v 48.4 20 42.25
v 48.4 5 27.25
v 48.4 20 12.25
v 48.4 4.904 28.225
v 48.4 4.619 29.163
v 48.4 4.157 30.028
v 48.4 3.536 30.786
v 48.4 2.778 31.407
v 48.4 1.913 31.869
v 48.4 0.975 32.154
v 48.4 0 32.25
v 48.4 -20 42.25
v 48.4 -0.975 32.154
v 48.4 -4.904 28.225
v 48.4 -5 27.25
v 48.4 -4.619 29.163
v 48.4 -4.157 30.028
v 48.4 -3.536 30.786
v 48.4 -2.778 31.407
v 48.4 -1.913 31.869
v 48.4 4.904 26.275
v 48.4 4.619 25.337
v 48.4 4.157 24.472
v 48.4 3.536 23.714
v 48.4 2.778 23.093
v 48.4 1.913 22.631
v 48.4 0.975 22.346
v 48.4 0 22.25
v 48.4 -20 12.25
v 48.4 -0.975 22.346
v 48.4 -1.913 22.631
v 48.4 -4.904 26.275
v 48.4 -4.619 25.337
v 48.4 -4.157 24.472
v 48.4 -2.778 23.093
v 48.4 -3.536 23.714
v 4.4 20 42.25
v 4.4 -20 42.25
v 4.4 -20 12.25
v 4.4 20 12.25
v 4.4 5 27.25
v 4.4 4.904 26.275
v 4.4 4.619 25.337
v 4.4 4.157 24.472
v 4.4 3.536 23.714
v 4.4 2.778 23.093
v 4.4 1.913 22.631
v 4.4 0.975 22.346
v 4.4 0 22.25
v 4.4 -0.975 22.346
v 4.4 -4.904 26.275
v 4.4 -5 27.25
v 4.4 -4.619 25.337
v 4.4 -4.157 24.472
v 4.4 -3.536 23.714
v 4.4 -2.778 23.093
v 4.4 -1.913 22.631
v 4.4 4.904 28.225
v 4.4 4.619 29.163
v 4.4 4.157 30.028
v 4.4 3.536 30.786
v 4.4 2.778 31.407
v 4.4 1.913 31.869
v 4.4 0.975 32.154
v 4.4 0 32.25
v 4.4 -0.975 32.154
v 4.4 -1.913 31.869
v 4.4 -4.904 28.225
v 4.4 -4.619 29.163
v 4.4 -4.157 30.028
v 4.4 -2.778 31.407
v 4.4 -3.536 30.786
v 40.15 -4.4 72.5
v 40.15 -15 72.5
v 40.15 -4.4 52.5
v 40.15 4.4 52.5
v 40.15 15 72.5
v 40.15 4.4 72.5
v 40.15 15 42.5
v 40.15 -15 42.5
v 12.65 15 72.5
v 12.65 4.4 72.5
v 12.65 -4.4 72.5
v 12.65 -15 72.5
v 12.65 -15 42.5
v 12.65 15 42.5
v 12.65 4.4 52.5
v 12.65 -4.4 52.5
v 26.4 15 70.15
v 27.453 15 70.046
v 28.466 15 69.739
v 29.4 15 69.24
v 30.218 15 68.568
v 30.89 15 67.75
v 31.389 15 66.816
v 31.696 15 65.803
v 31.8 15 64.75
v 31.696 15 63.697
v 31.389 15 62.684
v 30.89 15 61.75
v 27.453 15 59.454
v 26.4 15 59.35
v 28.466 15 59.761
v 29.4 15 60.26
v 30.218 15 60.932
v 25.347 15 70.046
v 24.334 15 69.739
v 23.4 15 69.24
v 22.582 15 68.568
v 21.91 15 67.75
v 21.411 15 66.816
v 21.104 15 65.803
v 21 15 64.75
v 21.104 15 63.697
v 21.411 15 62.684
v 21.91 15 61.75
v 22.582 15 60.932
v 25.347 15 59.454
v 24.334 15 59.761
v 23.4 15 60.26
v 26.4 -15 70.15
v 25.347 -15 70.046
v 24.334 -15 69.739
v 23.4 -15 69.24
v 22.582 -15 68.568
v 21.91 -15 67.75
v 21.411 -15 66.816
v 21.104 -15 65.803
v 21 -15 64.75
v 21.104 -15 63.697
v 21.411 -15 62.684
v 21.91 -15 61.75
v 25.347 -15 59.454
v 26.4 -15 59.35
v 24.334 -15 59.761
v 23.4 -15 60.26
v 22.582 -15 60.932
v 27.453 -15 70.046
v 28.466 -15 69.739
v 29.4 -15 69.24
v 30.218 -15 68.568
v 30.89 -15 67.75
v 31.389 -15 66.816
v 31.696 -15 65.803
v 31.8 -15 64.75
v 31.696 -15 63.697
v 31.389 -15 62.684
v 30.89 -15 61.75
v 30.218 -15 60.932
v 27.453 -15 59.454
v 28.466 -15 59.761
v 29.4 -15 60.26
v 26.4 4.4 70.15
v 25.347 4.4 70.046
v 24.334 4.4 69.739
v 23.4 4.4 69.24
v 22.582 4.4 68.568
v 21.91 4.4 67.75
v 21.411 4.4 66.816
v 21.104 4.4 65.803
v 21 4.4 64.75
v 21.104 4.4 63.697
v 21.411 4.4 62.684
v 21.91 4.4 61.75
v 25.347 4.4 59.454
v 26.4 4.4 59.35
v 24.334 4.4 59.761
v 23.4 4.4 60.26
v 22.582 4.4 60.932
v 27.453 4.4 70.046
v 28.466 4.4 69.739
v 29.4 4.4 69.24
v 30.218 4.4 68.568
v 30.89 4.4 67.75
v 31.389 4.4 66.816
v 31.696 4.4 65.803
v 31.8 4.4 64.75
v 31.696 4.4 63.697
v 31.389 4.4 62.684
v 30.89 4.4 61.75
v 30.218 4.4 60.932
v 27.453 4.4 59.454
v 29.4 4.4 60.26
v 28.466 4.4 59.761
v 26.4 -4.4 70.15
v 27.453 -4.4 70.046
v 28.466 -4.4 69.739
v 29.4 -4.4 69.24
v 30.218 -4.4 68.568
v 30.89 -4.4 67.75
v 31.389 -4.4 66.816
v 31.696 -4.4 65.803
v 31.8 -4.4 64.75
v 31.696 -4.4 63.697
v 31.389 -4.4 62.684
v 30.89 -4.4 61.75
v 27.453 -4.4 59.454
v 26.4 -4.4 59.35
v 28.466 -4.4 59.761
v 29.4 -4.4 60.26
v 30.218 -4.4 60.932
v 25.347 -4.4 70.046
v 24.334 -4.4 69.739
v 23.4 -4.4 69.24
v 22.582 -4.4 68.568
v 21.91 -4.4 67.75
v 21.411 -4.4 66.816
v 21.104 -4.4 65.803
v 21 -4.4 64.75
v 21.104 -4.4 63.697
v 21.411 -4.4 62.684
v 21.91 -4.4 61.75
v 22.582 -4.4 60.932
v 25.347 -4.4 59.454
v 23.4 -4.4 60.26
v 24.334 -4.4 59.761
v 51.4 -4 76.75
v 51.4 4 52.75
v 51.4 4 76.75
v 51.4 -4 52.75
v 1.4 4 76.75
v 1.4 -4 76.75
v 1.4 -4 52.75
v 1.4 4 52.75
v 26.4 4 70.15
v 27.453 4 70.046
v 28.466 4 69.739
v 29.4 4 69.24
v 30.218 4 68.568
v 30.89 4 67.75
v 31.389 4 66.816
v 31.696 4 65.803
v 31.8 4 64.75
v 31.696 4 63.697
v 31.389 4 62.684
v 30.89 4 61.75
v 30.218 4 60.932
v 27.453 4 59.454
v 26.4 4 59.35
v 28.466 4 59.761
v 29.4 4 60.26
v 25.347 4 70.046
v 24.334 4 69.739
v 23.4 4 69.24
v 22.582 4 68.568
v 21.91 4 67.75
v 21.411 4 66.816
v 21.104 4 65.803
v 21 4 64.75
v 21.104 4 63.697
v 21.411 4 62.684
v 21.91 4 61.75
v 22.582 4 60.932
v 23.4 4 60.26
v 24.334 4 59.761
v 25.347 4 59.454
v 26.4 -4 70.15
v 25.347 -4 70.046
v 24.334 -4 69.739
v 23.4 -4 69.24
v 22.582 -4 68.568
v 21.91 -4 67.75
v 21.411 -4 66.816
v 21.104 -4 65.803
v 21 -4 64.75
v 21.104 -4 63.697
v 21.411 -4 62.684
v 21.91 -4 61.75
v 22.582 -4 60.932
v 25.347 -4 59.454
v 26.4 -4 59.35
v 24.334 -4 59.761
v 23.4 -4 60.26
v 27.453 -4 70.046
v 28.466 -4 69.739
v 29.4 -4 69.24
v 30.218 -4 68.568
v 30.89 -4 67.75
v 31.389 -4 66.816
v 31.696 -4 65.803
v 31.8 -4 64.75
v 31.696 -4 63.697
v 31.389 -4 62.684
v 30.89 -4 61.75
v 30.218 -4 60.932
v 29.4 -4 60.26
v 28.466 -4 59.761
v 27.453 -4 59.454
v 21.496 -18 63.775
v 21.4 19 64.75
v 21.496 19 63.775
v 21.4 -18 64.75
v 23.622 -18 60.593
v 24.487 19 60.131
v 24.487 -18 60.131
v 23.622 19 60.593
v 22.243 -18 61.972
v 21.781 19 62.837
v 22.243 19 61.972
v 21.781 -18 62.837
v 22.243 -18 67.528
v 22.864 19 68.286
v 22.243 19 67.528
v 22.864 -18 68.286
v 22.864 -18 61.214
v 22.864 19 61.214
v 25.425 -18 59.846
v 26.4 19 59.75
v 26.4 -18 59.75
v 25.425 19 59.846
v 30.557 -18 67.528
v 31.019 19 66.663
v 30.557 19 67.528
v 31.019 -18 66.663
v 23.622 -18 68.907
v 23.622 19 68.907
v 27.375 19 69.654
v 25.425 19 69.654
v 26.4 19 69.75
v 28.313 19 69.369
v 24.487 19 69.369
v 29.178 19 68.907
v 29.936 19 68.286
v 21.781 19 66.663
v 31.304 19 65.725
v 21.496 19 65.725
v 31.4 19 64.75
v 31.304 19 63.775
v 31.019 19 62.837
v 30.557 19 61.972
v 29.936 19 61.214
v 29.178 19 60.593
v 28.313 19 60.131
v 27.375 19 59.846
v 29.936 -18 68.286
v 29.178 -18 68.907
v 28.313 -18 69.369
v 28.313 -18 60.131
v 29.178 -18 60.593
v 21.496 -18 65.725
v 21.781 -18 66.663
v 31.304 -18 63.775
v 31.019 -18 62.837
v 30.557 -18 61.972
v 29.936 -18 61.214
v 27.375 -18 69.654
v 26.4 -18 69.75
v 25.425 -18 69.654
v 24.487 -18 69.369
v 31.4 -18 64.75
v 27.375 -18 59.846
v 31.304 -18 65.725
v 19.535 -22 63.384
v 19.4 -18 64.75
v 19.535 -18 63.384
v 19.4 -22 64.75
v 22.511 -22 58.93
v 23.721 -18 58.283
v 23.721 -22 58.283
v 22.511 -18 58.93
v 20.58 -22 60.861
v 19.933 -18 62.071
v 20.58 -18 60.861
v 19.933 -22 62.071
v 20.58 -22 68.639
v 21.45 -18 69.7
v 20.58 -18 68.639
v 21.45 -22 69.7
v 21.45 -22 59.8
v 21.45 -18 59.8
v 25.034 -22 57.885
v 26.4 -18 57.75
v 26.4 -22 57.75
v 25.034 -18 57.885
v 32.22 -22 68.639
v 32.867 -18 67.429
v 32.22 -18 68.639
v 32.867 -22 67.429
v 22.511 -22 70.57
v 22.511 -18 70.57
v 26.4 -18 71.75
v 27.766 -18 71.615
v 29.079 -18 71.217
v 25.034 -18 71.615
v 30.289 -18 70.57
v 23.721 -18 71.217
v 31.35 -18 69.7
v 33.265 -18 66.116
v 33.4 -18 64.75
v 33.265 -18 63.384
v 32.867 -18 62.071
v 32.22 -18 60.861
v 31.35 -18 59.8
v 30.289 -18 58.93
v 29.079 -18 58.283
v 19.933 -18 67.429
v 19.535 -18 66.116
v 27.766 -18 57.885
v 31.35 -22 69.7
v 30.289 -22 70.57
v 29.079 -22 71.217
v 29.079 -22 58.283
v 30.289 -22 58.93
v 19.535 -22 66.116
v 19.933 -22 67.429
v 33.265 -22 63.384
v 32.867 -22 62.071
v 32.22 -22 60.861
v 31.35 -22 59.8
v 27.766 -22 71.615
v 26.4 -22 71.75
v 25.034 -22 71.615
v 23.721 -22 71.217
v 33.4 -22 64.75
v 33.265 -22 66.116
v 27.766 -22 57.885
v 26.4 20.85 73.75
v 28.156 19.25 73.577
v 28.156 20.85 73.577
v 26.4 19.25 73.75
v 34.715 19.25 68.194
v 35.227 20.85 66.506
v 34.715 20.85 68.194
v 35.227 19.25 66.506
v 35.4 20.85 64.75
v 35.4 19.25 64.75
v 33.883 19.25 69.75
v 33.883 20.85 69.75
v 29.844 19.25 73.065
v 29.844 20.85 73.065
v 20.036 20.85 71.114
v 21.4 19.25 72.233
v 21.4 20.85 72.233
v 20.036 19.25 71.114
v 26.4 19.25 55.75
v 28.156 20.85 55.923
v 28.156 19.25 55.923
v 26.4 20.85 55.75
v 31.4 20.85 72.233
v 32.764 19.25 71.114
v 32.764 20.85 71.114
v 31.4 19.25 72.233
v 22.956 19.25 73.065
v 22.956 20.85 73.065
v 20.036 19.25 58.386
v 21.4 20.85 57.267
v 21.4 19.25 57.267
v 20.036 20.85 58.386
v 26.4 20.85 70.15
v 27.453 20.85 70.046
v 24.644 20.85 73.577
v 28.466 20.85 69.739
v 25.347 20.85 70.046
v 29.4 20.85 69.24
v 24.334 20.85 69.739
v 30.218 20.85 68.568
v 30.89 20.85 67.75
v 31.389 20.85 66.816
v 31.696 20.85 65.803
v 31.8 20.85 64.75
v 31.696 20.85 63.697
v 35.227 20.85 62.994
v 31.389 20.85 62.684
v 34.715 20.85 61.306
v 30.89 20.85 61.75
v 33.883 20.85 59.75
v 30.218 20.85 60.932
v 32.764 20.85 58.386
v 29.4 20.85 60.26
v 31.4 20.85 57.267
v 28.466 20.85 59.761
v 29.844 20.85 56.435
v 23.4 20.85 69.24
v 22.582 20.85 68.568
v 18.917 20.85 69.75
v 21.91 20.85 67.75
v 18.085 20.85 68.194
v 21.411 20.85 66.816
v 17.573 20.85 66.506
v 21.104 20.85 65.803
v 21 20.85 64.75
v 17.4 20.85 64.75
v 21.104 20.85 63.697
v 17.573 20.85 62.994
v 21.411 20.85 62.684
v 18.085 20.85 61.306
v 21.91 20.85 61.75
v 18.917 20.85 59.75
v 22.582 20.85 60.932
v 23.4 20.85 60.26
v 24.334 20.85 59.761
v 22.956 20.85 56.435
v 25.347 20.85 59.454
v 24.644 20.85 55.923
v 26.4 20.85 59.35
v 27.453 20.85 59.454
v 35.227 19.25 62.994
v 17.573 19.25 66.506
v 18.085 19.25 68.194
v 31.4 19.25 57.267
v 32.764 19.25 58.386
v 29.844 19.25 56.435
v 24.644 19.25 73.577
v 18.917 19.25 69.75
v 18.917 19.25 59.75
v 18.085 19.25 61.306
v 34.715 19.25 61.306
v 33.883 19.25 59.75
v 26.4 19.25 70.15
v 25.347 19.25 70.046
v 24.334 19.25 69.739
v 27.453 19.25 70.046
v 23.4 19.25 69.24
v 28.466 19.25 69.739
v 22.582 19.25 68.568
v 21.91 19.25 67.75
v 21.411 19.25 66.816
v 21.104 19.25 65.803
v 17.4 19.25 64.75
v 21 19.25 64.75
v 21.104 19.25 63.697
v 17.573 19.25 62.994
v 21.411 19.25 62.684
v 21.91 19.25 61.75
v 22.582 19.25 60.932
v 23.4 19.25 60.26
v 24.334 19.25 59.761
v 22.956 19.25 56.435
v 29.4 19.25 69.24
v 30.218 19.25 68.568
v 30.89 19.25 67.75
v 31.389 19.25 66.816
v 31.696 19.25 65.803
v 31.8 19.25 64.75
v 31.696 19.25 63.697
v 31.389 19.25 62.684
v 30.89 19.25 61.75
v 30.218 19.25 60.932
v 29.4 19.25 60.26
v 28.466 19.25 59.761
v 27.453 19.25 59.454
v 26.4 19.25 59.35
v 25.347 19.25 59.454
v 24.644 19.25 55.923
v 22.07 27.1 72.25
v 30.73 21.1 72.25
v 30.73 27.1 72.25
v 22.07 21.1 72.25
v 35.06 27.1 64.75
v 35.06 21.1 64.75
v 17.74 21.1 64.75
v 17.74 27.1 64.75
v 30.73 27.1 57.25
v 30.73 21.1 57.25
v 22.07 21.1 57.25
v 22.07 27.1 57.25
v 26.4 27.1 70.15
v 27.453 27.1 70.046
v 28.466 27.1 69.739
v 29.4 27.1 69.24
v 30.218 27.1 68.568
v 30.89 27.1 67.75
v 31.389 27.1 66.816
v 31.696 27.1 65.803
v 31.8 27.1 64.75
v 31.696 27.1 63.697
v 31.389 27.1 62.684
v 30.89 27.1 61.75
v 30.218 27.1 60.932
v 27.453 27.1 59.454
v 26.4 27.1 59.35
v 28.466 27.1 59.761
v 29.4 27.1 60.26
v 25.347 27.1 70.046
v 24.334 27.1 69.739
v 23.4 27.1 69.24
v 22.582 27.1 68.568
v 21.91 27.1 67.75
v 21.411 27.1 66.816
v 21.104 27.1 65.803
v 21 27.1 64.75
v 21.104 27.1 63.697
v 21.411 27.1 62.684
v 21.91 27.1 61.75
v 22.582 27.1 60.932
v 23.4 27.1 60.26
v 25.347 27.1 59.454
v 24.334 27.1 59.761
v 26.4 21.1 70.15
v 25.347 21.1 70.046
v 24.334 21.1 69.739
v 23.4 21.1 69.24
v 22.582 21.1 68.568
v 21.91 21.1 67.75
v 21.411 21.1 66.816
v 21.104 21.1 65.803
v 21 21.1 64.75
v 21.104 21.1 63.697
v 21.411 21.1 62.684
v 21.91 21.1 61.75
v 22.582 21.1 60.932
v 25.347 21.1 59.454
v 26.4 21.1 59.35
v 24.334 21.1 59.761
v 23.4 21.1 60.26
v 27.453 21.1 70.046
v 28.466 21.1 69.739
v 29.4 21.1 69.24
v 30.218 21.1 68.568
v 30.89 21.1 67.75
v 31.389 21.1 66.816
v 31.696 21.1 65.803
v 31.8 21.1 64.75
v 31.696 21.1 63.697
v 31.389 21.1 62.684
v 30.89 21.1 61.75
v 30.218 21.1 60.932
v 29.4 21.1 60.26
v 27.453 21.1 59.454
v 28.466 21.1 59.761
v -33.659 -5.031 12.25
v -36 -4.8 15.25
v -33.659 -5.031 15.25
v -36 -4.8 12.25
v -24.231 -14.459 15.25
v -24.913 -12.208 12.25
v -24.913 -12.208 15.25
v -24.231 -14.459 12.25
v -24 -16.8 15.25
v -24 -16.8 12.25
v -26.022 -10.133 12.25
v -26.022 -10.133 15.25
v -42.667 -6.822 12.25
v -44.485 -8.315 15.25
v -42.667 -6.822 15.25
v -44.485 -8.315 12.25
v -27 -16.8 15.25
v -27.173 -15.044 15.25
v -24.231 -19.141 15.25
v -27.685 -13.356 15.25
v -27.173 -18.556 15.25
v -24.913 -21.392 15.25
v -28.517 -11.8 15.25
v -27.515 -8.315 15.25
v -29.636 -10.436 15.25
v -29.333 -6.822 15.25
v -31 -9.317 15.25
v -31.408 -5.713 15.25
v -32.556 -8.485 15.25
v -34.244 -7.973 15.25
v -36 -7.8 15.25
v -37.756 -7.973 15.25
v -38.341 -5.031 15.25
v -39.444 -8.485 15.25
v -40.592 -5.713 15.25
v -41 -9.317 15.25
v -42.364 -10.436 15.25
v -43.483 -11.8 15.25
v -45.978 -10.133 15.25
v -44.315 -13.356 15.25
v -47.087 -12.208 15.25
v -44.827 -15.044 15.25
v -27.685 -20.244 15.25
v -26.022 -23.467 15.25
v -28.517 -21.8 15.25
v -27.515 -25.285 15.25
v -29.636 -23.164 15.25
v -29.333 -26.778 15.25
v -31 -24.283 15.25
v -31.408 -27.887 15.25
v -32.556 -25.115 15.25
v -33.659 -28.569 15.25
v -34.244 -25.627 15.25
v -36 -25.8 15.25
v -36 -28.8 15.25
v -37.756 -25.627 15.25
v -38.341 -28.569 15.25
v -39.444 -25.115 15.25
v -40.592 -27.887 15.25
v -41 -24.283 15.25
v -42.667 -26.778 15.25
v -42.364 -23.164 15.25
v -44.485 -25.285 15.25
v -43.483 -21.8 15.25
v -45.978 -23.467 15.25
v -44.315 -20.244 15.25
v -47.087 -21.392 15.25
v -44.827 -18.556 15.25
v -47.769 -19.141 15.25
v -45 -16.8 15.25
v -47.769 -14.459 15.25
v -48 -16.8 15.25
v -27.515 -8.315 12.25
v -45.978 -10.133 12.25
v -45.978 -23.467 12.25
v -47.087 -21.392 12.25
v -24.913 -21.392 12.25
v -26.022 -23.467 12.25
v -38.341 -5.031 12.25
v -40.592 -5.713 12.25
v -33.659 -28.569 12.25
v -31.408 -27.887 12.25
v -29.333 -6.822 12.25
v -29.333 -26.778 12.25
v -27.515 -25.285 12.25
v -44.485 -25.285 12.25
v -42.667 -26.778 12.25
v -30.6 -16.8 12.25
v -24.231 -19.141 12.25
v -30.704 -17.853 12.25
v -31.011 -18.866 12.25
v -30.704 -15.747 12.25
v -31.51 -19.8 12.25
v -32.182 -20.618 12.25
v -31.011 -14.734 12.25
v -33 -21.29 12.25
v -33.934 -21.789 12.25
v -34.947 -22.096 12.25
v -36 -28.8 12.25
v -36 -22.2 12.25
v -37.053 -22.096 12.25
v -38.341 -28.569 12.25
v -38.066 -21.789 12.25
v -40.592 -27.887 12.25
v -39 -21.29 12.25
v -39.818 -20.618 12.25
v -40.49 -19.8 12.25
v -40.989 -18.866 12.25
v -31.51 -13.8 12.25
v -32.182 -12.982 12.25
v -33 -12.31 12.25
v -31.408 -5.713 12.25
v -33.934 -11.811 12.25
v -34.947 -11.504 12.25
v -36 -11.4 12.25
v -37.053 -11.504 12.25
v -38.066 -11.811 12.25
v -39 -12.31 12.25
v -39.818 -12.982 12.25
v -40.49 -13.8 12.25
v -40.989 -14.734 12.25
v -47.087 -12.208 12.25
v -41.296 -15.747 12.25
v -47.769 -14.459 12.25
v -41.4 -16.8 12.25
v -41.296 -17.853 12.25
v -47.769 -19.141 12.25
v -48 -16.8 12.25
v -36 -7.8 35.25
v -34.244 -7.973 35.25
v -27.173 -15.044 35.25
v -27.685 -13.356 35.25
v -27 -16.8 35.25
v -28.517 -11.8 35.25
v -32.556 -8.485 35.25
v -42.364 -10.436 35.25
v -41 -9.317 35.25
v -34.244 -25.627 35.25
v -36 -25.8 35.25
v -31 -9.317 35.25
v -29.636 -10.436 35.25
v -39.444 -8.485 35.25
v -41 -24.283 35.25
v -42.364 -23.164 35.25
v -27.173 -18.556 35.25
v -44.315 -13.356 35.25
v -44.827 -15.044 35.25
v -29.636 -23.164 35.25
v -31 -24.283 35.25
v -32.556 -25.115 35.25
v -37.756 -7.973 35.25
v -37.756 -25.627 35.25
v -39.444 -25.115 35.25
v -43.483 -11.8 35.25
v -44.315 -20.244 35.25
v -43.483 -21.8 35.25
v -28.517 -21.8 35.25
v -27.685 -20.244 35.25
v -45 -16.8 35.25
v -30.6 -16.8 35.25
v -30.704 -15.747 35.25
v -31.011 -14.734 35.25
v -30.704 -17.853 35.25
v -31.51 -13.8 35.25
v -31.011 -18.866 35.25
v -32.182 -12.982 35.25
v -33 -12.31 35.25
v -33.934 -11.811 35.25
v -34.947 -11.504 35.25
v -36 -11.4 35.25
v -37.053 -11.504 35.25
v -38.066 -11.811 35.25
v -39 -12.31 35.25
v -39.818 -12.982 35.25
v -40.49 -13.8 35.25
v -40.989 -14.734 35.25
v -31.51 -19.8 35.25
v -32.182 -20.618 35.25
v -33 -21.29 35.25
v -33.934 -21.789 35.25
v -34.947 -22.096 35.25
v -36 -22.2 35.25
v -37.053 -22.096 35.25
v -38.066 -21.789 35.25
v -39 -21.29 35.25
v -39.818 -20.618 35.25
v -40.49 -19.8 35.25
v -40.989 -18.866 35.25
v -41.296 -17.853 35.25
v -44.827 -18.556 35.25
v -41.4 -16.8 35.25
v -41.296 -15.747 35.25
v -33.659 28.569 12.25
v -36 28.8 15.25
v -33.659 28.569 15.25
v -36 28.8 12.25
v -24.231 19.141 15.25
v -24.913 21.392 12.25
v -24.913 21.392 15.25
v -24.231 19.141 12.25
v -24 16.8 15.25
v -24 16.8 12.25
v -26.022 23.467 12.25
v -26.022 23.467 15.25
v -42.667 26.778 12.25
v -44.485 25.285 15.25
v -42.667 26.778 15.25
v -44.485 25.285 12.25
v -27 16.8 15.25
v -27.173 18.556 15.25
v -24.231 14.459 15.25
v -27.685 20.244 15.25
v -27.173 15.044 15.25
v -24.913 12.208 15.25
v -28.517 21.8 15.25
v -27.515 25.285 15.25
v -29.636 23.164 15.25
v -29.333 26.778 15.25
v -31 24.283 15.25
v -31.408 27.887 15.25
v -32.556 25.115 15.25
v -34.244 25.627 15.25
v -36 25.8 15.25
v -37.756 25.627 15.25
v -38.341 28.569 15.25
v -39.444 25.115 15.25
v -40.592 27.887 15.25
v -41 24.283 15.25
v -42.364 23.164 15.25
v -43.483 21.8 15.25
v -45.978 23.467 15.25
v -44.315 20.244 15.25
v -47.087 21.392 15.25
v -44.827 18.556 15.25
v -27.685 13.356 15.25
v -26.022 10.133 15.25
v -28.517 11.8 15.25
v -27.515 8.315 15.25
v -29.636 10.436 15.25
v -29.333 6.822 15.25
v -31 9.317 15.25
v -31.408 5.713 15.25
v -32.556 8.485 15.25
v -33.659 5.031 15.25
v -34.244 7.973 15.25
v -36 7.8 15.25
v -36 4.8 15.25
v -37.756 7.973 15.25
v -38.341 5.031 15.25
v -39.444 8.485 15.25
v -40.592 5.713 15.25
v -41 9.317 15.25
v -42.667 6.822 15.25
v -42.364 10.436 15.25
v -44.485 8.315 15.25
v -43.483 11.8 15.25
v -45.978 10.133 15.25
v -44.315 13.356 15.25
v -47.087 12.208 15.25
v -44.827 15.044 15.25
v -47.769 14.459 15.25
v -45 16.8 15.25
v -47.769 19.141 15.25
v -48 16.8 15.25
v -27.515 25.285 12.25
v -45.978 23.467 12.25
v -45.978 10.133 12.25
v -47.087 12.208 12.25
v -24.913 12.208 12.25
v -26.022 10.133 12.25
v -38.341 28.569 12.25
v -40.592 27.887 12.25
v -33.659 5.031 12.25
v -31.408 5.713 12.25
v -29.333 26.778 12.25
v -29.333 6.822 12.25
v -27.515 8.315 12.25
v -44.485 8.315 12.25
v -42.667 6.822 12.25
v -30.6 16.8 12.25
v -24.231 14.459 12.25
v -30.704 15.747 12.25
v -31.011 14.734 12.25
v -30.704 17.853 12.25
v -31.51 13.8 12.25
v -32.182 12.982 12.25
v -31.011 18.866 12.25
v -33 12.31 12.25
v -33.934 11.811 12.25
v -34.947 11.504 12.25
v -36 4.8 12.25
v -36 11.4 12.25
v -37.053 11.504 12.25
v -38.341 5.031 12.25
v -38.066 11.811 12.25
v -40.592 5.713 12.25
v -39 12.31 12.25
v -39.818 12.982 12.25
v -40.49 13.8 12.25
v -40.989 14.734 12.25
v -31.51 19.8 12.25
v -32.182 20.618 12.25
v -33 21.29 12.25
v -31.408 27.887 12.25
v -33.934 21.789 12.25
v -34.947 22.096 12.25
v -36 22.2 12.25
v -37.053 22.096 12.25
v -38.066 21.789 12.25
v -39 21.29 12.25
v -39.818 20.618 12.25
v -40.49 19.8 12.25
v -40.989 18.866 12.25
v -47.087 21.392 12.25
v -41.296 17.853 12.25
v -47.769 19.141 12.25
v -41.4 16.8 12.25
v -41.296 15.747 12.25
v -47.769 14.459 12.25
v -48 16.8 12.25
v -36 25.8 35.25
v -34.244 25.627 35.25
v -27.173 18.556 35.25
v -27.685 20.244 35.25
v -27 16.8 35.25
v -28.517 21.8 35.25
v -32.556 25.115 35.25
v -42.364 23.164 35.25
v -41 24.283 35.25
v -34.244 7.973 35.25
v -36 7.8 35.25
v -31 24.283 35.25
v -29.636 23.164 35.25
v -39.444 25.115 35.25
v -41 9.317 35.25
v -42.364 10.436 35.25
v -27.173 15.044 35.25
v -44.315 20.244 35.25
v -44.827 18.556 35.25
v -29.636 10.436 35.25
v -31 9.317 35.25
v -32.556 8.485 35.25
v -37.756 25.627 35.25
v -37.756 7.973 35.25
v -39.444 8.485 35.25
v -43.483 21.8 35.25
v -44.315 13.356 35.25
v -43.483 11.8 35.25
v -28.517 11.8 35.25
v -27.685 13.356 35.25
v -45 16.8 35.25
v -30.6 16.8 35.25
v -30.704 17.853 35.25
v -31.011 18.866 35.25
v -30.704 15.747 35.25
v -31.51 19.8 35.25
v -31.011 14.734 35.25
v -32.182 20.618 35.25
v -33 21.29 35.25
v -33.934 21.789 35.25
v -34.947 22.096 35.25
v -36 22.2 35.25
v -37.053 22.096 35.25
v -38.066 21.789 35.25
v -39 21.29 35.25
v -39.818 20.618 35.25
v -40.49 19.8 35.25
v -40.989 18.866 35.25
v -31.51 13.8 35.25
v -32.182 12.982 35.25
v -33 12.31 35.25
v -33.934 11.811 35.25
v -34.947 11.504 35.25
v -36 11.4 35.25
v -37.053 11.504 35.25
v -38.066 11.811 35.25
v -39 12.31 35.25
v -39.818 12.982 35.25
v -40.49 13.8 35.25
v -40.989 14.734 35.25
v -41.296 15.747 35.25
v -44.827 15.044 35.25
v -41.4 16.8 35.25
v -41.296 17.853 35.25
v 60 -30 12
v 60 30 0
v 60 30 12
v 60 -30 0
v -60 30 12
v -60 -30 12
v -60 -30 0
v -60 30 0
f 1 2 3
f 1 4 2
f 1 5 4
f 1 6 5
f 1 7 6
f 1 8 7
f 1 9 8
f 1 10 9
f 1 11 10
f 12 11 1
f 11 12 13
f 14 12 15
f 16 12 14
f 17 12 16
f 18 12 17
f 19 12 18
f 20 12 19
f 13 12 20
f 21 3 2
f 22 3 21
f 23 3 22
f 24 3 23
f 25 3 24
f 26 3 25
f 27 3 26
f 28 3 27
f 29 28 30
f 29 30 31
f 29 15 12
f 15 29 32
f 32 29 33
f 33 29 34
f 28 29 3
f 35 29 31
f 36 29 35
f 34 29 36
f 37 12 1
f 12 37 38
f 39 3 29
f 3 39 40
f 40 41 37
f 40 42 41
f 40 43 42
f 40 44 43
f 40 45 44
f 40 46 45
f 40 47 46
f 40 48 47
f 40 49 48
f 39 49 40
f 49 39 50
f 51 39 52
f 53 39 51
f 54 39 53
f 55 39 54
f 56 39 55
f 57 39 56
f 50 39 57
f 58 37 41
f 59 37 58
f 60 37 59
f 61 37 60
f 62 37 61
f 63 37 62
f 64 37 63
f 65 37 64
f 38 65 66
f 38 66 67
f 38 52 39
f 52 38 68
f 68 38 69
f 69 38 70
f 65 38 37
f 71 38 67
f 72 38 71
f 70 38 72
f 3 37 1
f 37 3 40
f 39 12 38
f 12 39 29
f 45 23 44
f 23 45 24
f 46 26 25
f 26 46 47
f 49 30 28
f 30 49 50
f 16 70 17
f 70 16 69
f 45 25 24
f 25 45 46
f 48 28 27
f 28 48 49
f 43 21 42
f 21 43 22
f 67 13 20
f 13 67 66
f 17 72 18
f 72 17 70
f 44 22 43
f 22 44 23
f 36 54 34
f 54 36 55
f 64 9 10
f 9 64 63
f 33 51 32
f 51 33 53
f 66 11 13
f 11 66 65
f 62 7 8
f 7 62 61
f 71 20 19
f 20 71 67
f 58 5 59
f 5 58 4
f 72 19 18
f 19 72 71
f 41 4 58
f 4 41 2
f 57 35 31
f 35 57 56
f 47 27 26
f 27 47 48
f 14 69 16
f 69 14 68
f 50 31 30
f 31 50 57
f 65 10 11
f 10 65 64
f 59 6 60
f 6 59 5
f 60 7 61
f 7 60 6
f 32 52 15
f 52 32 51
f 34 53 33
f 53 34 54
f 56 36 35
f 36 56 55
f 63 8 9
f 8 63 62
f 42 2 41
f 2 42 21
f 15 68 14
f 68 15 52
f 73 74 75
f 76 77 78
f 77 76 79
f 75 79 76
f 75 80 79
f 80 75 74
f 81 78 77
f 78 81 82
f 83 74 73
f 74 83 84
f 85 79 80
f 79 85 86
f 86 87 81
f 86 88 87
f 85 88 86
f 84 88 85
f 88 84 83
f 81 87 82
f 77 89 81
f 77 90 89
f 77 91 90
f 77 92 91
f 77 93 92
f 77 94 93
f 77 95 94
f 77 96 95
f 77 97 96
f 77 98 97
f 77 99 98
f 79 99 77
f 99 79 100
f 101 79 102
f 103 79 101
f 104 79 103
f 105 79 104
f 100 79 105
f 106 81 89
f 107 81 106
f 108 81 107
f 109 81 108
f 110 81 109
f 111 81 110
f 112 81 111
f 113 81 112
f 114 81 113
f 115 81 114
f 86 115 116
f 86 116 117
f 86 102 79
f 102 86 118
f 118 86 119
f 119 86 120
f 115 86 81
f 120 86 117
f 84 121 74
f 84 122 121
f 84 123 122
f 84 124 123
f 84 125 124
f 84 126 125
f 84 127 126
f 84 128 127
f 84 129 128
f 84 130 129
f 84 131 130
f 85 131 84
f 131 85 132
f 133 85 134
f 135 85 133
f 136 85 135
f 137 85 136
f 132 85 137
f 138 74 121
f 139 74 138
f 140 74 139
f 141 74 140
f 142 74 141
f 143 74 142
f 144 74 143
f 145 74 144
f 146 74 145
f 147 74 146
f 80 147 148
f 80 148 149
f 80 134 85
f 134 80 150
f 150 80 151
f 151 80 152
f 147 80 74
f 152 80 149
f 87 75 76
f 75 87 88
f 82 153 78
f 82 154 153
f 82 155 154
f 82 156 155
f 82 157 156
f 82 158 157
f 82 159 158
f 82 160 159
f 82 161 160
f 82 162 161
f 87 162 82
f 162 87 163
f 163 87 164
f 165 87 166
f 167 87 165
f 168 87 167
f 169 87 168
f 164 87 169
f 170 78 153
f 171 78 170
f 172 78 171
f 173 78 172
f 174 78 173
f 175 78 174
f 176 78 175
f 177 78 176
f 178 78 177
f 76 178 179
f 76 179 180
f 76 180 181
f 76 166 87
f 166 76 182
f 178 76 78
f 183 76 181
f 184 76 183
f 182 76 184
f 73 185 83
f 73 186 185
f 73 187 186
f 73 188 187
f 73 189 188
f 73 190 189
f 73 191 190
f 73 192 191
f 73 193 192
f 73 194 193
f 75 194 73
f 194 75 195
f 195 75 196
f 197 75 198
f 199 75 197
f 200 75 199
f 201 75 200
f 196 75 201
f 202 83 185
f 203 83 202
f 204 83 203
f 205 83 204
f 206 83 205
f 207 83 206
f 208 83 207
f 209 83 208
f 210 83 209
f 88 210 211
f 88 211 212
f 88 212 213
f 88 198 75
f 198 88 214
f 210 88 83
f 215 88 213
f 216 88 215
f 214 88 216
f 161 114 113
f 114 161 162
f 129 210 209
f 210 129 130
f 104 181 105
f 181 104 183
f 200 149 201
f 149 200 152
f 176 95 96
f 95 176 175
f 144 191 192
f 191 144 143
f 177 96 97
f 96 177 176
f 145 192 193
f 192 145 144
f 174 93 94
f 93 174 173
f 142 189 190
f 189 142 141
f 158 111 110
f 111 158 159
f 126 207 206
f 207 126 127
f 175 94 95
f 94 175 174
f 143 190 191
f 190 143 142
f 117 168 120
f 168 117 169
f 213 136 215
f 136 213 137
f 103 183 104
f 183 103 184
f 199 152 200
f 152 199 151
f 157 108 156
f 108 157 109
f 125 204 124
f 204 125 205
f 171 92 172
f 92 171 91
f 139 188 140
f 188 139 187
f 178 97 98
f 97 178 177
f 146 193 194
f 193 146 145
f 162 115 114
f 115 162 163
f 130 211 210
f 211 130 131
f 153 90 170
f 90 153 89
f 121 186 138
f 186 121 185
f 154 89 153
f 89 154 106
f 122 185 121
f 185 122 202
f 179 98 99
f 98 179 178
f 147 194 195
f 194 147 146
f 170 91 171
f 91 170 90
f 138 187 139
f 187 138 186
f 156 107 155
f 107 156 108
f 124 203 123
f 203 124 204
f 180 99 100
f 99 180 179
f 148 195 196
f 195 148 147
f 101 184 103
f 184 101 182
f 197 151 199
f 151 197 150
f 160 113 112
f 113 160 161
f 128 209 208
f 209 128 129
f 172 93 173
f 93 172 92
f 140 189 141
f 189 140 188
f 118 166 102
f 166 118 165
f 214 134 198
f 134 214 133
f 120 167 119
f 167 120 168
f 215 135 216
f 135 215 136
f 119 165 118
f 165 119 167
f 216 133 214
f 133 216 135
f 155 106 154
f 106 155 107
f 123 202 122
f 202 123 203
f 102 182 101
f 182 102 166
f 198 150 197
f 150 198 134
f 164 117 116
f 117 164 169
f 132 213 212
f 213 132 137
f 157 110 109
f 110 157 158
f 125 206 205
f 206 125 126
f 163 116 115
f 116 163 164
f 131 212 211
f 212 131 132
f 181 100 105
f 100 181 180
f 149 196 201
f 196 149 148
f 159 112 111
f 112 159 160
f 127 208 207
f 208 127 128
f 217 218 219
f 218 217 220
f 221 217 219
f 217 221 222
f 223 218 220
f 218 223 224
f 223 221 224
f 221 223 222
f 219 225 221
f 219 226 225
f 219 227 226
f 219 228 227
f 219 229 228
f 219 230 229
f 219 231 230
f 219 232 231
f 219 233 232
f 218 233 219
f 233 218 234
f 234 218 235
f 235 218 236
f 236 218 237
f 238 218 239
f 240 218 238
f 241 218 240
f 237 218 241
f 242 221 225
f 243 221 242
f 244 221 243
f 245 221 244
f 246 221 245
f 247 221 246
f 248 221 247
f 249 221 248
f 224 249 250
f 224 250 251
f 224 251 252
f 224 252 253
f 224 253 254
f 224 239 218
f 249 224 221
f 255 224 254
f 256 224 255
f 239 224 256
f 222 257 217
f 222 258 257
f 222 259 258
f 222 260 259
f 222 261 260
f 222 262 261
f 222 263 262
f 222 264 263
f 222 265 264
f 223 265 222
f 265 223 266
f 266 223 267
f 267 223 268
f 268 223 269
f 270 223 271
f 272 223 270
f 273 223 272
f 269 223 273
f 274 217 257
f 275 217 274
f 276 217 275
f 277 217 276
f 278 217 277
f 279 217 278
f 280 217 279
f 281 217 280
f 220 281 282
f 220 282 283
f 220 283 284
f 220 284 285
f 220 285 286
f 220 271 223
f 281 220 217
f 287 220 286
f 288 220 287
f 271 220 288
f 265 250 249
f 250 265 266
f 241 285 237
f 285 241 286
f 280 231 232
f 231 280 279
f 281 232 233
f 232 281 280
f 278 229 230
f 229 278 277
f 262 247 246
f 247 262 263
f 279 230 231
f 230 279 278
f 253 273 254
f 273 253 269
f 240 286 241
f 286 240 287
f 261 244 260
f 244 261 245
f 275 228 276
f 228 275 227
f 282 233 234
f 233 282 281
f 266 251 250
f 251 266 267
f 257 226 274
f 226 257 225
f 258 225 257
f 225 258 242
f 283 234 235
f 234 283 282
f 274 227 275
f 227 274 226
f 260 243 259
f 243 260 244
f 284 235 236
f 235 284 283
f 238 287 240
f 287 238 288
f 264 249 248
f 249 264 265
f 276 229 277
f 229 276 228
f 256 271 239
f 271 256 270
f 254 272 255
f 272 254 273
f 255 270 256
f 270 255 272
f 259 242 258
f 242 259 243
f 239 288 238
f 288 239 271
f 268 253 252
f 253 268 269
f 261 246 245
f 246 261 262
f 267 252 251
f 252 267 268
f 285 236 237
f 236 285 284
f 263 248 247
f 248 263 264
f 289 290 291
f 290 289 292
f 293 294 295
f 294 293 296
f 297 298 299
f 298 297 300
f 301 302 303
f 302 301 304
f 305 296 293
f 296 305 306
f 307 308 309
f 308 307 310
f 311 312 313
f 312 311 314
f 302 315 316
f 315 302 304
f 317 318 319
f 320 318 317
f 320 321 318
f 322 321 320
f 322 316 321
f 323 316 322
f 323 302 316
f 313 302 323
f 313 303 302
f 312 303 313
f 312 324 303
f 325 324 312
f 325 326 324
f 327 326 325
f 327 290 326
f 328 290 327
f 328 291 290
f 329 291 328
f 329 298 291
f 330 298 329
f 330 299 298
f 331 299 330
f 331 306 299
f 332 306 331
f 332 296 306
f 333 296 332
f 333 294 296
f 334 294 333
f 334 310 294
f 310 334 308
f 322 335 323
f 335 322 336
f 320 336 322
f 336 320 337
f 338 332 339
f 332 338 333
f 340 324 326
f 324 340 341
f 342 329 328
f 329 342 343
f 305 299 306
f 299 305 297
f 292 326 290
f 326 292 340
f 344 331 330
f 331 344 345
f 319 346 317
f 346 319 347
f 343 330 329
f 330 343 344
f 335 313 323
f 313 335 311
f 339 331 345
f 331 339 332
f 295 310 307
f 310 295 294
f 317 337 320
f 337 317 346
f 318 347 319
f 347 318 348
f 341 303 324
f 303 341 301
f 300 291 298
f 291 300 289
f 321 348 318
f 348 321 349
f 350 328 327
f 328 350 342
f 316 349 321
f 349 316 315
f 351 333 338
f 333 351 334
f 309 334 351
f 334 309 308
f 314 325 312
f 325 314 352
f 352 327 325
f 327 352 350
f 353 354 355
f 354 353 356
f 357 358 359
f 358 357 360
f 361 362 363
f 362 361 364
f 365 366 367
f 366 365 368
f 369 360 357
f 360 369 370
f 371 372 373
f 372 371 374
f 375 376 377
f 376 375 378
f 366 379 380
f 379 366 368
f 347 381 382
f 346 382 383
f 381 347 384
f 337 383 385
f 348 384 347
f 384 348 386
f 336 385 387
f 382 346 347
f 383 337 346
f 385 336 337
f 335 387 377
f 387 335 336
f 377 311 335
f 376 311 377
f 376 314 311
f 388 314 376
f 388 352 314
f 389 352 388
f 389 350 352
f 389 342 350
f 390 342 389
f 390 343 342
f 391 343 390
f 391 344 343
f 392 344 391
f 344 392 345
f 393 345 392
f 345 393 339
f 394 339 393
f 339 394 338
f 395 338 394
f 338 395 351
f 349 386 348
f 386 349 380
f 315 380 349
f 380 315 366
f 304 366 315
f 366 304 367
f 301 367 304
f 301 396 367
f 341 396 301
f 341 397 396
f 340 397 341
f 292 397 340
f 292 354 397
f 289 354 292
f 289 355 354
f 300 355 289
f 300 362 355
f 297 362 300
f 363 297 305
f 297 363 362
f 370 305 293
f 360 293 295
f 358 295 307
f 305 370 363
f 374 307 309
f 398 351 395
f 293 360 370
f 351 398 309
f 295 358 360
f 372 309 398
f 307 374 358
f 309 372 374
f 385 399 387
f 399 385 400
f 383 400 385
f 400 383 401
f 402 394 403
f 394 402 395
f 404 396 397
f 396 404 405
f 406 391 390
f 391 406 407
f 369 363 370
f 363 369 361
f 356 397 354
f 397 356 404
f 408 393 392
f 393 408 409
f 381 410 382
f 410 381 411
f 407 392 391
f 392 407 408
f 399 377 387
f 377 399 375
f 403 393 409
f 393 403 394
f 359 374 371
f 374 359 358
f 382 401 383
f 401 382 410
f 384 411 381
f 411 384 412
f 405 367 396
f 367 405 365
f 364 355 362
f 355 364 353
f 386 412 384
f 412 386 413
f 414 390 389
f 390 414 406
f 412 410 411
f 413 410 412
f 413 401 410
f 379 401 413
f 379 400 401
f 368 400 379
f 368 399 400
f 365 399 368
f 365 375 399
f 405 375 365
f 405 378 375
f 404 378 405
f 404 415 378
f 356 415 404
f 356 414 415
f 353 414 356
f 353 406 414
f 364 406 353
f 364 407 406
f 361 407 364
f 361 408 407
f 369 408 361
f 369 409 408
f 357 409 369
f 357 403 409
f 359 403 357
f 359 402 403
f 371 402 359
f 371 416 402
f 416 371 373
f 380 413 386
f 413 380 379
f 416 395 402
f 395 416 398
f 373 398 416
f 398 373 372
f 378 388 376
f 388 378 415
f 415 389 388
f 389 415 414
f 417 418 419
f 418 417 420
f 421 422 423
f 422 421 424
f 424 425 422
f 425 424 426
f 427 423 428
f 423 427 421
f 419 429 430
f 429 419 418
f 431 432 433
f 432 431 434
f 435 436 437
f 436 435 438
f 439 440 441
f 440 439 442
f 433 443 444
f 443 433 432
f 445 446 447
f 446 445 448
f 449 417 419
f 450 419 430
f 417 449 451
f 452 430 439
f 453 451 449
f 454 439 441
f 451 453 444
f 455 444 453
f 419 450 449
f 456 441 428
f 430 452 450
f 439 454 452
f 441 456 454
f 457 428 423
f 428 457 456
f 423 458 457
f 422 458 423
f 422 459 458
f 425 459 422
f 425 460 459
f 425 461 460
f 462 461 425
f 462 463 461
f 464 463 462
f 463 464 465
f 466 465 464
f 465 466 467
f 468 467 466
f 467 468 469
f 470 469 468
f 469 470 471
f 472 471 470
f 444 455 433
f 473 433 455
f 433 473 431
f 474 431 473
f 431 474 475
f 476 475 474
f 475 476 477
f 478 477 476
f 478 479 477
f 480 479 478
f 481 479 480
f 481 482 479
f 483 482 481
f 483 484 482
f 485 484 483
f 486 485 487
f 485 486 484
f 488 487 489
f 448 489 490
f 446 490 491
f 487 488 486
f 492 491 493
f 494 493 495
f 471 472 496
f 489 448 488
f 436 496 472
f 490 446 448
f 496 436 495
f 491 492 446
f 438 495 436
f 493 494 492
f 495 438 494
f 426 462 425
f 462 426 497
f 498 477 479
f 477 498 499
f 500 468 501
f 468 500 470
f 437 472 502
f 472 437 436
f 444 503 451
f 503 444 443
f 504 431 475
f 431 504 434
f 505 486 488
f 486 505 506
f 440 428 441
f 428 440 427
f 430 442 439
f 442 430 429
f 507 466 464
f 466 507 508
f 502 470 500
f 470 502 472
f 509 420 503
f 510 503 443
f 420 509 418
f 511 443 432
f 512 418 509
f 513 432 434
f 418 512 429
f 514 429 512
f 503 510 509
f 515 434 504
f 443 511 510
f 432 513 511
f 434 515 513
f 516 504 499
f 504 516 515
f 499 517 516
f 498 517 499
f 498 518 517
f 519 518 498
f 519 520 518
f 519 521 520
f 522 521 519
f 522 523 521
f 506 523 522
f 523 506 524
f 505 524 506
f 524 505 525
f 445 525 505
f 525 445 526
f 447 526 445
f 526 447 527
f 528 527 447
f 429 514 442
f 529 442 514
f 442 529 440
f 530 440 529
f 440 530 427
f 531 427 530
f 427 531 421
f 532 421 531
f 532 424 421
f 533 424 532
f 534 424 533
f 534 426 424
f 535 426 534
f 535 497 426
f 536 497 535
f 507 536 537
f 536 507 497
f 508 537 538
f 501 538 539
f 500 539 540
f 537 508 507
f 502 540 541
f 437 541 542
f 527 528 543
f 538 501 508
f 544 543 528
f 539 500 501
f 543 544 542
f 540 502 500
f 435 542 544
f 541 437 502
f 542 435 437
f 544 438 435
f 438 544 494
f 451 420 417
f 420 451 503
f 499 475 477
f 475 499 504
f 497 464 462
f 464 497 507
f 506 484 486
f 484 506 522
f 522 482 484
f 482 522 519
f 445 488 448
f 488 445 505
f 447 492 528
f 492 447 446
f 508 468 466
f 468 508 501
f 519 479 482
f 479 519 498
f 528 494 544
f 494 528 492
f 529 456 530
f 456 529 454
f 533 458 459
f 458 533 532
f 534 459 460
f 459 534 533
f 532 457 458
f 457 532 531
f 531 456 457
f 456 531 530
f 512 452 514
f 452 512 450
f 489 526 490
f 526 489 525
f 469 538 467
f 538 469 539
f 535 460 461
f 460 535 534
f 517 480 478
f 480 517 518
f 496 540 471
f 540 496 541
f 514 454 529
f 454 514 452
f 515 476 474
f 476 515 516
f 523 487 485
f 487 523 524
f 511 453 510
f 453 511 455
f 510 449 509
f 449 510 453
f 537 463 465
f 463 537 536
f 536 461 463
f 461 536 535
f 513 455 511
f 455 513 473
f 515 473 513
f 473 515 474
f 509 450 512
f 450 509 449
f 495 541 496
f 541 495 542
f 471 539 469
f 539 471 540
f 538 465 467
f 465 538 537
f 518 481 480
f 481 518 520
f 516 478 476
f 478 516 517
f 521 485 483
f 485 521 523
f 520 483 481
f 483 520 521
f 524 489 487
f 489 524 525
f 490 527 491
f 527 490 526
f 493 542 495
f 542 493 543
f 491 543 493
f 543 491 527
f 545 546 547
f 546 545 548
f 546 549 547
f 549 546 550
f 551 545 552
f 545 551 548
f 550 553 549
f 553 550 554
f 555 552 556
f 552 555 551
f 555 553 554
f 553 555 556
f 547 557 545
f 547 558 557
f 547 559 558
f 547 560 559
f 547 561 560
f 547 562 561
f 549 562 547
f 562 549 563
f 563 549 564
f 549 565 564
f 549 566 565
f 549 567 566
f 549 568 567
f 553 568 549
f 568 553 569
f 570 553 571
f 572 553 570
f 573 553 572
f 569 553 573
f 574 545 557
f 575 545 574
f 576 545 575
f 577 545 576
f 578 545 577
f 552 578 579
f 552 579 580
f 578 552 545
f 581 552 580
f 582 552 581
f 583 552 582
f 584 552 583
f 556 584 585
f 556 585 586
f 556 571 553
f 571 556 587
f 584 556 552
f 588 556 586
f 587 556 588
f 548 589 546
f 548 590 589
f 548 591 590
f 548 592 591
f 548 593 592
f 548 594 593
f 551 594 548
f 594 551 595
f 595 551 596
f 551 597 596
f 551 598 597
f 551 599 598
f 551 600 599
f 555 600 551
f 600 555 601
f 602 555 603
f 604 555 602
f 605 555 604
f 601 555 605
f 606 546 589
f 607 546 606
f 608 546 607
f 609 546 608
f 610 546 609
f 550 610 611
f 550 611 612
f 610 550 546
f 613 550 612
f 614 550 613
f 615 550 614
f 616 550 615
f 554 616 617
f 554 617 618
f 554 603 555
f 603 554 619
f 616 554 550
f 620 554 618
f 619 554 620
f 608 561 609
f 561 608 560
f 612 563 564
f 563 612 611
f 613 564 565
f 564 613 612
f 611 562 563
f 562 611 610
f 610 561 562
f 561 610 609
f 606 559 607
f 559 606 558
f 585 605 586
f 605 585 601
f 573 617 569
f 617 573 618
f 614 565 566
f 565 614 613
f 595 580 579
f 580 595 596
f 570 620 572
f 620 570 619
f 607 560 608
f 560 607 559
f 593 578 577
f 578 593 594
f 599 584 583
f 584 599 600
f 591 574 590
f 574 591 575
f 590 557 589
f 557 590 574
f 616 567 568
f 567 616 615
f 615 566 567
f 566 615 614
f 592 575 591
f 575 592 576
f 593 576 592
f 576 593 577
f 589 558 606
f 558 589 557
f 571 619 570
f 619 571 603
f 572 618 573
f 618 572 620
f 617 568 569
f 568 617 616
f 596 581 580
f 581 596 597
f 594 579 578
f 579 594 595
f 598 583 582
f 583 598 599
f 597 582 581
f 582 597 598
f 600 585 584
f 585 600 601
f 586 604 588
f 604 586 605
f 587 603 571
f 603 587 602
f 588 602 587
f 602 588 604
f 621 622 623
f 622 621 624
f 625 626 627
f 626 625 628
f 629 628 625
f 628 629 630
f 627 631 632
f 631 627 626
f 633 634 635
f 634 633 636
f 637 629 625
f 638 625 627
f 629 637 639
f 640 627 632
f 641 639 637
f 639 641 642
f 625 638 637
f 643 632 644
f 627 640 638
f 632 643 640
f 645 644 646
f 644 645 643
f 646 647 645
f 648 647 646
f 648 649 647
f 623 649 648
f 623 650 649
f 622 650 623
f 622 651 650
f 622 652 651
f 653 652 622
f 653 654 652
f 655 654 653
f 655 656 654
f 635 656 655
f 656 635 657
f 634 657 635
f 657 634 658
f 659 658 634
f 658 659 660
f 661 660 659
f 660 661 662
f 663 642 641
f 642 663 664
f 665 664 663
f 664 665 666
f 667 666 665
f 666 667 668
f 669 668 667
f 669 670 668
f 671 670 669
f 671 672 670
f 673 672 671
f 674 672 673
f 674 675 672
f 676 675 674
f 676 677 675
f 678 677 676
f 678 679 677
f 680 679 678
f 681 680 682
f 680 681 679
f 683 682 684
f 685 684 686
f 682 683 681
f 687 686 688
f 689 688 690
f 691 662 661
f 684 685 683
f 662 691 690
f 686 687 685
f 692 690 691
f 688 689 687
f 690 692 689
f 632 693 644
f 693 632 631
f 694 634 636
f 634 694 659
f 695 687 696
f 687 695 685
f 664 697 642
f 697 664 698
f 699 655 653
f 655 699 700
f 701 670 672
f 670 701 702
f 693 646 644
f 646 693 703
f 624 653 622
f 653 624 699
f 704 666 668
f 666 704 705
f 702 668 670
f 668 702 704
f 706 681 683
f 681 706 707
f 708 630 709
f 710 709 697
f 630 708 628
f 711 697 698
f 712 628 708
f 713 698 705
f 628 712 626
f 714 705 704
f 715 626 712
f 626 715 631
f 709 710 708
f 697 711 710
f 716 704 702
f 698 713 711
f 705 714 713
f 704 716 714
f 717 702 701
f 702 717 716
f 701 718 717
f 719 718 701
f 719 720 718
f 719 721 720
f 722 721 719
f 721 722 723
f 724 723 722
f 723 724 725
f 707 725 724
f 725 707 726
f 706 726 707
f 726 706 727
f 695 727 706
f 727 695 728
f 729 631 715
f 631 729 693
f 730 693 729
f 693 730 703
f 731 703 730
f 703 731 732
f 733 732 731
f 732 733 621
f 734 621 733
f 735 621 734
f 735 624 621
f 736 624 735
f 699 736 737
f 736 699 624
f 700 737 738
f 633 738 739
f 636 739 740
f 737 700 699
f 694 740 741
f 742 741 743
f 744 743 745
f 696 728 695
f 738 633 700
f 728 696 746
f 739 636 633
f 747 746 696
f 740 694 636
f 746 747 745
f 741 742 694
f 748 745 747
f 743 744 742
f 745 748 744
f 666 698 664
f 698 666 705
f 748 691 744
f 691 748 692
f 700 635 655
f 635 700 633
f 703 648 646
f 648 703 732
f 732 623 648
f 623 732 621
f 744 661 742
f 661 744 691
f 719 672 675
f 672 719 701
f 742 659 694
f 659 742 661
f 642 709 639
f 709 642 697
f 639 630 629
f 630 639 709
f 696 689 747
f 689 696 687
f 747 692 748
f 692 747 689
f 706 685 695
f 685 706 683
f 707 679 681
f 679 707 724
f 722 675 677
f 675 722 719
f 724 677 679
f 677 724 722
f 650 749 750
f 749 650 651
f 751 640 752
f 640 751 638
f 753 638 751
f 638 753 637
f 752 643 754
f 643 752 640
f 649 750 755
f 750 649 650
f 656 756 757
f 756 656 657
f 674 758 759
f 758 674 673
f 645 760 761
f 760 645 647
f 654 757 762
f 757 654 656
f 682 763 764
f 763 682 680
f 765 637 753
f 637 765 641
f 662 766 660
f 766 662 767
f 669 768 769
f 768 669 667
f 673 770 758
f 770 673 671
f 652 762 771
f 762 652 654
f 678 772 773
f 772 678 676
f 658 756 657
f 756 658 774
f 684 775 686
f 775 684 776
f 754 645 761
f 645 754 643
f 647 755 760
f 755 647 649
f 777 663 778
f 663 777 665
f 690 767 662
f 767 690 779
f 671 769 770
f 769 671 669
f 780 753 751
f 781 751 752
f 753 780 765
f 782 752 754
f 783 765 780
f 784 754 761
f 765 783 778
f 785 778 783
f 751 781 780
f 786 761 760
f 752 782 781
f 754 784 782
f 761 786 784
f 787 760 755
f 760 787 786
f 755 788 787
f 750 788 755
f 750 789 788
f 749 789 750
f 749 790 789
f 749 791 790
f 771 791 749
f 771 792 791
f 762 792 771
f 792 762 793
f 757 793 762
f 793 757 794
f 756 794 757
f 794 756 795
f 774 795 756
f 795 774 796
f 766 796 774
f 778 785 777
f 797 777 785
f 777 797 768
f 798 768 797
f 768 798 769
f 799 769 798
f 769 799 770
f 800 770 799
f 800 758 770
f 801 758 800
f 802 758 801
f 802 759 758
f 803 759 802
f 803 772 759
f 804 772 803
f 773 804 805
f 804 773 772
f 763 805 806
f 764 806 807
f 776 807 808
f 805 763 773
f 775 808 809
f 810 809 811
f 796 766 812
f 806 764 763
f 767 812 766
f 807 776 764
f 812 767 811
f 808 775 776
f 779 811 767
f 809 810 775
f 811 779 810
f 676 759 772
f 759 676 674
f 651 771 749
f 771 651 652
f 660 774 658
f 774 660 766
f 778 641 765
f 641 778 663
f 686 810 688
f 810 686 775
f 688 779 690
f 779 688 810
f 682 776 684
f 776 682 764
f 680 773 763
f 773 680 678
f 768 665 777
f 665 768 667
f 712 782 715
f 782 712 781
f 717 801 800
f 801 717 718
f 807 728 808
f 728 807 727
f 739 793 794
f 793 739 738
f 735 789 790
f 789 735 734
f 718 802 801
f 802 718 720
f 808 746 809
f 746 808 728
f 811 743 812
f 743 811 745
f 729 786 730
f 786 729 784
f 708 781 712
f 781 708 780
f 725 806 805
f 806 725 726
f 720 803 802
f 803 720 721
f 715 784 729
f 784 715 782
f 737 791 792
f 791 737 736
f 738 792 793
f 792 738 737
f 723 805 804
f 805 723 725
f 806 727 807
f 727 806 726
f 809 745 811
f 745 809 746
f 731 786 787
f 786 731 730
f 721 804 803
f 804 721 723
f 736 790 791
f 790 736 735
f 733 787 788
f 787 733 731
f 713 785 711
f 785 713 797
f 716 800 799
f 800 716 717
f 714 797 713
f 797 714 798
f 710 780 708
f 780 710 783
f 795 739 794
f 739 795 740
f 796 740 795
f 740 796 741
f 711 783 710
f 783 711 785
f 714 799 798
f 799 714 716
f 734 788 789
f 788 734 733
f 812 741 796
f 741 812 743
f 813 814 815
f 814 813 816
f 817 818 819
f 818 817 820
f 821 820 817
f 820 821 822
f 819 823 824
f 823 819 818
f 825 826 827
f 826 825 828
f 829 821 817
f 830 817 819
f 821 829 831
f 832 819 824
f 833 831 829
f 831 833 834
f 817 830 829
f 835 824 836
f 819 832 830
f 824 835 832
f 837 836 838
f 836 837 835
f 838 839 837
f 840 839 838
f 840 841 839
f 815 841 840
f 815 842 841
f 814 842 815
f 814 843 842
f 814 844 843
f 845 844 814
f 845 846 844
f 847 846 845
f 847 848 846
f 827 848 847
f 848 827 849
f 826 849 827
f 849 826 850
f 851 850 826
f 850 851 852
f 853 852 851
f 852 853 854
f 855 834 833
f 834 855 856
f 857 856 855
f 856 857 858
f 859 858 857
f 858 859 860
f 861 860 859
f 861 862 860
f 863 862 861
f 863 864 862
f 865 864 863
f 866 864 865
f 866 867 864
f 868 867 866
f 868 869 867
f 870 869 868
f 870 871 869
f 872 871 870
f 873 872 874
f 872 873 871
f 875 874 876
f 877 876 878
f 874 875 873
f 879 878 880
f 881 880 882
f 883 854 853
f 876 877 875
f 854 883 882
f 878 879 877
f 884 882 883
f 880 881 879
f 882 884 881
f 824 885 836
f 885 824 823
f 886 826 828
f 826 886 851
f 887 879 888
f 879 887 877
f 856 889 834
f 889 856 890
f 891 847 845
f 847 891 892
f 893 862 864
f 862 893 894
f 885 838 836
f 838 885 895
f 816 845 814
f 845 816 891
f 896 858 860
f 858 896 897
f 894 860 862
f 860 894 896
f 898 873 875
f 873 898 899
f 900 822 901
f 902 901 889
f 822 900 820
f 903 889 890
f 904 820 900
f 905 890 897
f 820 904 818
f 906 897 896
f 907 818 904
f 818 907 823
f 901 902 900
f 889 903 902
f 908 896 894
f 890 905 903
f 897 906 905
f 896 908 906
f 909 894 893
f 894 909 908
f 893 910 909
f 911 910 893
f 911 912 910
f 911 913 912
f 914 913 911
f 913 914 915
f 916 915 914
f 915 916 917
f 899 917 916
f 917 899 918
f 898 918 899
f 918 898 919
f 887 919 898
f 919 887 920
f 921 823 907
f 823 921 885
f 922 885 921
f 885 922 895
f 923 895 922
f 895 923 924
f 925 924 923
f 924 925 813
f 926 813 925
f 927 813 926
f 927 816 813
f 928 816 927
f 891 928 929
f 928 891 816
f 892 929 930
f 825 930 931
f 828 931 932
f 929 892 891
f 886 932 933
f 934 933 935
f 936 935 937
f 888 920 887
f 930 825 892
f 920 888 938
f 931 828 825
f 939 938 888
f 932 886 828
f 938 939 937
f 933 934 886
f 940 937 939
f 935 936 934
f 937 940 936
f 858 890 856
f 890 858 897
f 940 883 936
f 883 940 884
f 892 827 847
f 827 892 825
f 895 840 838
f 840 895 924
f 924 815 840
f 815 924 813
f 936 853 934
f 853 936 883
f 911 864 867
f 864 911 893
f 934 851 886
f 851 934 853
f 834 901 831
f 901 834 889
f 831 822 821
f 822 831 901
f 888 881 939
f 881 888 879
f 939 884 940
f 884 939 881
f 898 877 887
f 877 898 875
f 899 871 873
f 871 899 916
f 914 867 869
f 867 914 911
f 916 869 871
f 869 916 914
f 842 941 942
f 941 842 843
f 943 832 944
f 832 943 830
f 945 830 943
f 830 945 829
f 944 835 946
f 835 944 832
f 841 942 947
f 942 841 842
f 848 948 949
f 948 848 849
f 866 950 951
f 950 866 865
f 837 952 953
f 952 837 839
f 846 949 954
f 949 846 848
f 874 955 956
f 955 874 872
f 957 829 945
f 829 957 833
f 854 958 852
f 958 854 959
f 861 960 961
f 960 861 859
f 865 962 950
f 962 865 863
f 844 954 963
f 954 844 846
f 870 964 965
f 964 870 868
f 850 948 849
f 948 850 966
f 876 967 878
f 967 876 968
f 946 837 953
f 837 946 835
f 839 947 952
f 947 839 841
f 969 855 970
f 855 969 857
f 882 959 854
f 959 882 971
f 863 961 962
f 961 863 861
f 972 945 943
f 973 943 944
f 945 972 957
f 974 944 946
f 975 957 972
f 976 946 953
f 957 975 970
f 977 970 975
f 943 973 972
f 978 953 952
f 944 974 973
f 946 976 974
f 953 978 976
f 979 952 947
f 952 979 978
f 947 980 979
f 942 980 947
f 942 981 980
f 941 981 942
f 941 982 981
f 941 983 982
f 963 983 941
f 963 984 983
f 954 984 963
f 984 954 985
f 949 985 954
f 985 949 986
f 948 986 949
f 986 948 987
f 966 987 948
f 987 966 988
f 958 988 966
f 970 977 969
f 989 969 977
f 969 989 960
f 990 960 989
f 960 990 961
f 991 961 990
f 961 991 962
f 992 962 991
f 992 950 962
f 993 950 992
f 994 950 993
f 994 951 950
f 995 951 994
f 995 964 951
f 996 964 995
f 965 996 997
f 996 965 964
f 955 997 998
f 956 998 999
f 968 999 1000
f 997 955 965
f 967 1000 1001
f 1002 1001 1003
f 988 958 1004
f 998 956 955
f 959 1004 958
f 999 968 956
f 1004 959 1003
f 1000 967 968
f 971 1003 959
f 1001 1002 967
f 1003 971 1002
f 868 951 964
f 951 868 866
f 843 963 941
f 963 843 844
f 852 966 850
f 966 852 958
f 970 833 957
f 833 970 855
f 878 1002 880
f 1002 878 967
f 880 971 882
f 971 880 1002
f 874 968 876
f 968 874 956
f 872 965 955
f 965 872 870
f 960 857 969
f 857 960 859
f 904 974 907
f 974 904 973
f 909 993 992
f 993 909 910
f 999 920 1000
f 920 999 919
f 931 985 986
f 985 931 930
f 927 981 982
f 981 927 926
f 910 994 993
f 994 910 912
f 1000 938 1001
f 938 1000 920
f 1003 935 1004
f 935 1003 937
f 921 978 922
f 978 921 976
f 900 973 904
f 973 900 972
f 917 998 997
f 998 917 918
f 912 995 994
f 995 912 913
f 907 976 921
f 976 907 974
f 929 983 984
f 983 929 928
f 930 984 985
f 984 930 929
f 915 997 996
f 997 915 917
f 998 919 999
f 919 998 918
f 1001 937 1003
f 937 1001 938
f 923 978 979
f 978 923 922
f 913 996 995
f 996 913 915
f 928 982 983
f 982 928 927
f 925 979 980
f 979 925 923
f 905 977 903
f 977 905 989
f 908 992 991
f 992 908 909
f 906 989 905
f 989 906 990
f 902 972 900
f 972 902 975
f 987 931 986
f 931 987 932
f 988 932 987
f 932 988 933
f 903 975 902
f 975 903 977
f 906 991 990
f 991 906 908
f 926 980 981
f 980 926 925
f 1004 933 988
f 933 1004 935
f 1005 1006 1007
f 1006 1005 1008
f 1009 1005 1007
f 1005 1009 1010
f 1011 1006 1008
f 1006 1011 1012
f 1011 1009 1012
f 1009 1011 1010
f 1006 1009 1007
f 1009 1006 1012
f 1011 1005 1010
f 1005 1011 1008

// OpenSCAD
$fn = 32;

// ------------------------------------------------------------------------
// Indexing jig: plate 120 x 60 mm, pin d10
// Every part is its own module, assembly() places every instance.
// ------------------------------------------------------------------------

// --- part 1 ---
module jig_plate() {
  difference() {
    translate([-60, -30, 0]) cube([120, 60, 12]);
  }
}

// --- part 2 ---
module locator_block() {
  difference() {
    translate([-22, -20, 0]) cube([44, 40, 30]);
    translate([0, 0, 15]) rotate([0, 90, 0]) cylinder(h = 46, d = 10, center = true);
  }
}

// --- part 3 ---
module index_fork() {
  difference() {
    translate([-13.75, -15, 0]) cube([27.5, 30, 30]);
    translate([-14.75, -4.4, 10]) cube([29.5, 8.8, 21]);
    translate([0, 0, 22.25]) rotate([90, 0, 0]) cylinder(h = 32, d = 10.8, center = true);
  }
}

// --- part 4 ---
module index_arm() {
  difference() {
    translate([-25, -4, 0]) cube([50, 8, 24]);
    translate([0, 0, 12]) rotate([90, 0, 0]) cylinder(h = 10, d = 10.8, center = true);
  }
}

// --- part 5 ---
module index_pin() {
  rotate([0, 90, 0]) cylinder(h = 38, d = 10, center = true);
  translate([-22, 0, 0]) rotate([0, 90, 0]) cylinder(h = 4, d = 14);
}

// --- part 6 ---
module pin_washer() {
  difference() {
      translate([0, 0, 0]) cylinder(h = 1.6, d = 18);
      translate([0, 0, -1]) cylinder(h = 3.6, d = 10.8);
    }
}

// --- part 7 ---
module lock_nut() {
  difference() {
    linear_extrude(height = 6) polygon(points = [[8.66, 0], [4.33, 7.5], [-4.33, 7.5], [-8.66, 0], [-4.33, -7.5], [4.33, -7.5]]);
    translate([0, 0, -1]) cylinder(h = 8, d = 10.8);
  }
}

// --- part 8 ---
module guide_bush_a() {
  difference() {
    union() {
      cylinder(h = 3, d = 24);
      translate([0, 0, 3]) cylinder(h = 20, d = 18);
    }
    translate([0, 0, -1]) cylinder(h = 25, d = 10.8);
  }
}

// --- part 9 ---
module guide_bush_b() {
  difference() {
    union() {
      cylinder(h = 3, d = 24);
      translate([0, 0, 3]) cylinder(h = 20, d = 18);
    }
    translate([0, 0, -1]) cylinder(h = 25, d = 10.8);
  }
}

// --- assembly ---
module assembly() {
  color([0.80, 0.24, 0.20]) translate([0, 0, 0]) rotate([0, 0, 0]) jig_plate();
  color([0.20, 0.45, 0.75]) translate([26.4, 0, 12.25]) rotate([0, 0, 0]) locator_block();
  color([0.25, 0.62, 0.32]) translate([26.4, 0, 42.5]) rotate([0, 0, 0]) index_fork();
  color([0.92, 0.70, 0.18]) translate([26.4, 0, 52.75]) rotate([0, 0, 0]) index_arm();
  color([0.58, 0.35, 0.70]) translate([26.4, 0, 64.75]) rotate([0, 0, 90]) index_pin();
  color([0.16, 0.66, 0.66]) translate([26.4, 20.85, 64.75]) rotate([90, 0, 0]) pin_washer();
  color([0.85, 0.48, 0.18]) translate([26.4, 27.1, 64.75]) rotate([90, 0, 0]) lock_nut();
  color([0.55, 0.60, 0.65]) translate([-36, -16.8, 12.25]) rotate([0, 0, 0]) guide_bush_a();
  color([0.75, 0.30, 0.55]) translate([-36, 16.8, 12.25]) rotate([0, 0, 0]) guide_bush_b();
}

assembly();
